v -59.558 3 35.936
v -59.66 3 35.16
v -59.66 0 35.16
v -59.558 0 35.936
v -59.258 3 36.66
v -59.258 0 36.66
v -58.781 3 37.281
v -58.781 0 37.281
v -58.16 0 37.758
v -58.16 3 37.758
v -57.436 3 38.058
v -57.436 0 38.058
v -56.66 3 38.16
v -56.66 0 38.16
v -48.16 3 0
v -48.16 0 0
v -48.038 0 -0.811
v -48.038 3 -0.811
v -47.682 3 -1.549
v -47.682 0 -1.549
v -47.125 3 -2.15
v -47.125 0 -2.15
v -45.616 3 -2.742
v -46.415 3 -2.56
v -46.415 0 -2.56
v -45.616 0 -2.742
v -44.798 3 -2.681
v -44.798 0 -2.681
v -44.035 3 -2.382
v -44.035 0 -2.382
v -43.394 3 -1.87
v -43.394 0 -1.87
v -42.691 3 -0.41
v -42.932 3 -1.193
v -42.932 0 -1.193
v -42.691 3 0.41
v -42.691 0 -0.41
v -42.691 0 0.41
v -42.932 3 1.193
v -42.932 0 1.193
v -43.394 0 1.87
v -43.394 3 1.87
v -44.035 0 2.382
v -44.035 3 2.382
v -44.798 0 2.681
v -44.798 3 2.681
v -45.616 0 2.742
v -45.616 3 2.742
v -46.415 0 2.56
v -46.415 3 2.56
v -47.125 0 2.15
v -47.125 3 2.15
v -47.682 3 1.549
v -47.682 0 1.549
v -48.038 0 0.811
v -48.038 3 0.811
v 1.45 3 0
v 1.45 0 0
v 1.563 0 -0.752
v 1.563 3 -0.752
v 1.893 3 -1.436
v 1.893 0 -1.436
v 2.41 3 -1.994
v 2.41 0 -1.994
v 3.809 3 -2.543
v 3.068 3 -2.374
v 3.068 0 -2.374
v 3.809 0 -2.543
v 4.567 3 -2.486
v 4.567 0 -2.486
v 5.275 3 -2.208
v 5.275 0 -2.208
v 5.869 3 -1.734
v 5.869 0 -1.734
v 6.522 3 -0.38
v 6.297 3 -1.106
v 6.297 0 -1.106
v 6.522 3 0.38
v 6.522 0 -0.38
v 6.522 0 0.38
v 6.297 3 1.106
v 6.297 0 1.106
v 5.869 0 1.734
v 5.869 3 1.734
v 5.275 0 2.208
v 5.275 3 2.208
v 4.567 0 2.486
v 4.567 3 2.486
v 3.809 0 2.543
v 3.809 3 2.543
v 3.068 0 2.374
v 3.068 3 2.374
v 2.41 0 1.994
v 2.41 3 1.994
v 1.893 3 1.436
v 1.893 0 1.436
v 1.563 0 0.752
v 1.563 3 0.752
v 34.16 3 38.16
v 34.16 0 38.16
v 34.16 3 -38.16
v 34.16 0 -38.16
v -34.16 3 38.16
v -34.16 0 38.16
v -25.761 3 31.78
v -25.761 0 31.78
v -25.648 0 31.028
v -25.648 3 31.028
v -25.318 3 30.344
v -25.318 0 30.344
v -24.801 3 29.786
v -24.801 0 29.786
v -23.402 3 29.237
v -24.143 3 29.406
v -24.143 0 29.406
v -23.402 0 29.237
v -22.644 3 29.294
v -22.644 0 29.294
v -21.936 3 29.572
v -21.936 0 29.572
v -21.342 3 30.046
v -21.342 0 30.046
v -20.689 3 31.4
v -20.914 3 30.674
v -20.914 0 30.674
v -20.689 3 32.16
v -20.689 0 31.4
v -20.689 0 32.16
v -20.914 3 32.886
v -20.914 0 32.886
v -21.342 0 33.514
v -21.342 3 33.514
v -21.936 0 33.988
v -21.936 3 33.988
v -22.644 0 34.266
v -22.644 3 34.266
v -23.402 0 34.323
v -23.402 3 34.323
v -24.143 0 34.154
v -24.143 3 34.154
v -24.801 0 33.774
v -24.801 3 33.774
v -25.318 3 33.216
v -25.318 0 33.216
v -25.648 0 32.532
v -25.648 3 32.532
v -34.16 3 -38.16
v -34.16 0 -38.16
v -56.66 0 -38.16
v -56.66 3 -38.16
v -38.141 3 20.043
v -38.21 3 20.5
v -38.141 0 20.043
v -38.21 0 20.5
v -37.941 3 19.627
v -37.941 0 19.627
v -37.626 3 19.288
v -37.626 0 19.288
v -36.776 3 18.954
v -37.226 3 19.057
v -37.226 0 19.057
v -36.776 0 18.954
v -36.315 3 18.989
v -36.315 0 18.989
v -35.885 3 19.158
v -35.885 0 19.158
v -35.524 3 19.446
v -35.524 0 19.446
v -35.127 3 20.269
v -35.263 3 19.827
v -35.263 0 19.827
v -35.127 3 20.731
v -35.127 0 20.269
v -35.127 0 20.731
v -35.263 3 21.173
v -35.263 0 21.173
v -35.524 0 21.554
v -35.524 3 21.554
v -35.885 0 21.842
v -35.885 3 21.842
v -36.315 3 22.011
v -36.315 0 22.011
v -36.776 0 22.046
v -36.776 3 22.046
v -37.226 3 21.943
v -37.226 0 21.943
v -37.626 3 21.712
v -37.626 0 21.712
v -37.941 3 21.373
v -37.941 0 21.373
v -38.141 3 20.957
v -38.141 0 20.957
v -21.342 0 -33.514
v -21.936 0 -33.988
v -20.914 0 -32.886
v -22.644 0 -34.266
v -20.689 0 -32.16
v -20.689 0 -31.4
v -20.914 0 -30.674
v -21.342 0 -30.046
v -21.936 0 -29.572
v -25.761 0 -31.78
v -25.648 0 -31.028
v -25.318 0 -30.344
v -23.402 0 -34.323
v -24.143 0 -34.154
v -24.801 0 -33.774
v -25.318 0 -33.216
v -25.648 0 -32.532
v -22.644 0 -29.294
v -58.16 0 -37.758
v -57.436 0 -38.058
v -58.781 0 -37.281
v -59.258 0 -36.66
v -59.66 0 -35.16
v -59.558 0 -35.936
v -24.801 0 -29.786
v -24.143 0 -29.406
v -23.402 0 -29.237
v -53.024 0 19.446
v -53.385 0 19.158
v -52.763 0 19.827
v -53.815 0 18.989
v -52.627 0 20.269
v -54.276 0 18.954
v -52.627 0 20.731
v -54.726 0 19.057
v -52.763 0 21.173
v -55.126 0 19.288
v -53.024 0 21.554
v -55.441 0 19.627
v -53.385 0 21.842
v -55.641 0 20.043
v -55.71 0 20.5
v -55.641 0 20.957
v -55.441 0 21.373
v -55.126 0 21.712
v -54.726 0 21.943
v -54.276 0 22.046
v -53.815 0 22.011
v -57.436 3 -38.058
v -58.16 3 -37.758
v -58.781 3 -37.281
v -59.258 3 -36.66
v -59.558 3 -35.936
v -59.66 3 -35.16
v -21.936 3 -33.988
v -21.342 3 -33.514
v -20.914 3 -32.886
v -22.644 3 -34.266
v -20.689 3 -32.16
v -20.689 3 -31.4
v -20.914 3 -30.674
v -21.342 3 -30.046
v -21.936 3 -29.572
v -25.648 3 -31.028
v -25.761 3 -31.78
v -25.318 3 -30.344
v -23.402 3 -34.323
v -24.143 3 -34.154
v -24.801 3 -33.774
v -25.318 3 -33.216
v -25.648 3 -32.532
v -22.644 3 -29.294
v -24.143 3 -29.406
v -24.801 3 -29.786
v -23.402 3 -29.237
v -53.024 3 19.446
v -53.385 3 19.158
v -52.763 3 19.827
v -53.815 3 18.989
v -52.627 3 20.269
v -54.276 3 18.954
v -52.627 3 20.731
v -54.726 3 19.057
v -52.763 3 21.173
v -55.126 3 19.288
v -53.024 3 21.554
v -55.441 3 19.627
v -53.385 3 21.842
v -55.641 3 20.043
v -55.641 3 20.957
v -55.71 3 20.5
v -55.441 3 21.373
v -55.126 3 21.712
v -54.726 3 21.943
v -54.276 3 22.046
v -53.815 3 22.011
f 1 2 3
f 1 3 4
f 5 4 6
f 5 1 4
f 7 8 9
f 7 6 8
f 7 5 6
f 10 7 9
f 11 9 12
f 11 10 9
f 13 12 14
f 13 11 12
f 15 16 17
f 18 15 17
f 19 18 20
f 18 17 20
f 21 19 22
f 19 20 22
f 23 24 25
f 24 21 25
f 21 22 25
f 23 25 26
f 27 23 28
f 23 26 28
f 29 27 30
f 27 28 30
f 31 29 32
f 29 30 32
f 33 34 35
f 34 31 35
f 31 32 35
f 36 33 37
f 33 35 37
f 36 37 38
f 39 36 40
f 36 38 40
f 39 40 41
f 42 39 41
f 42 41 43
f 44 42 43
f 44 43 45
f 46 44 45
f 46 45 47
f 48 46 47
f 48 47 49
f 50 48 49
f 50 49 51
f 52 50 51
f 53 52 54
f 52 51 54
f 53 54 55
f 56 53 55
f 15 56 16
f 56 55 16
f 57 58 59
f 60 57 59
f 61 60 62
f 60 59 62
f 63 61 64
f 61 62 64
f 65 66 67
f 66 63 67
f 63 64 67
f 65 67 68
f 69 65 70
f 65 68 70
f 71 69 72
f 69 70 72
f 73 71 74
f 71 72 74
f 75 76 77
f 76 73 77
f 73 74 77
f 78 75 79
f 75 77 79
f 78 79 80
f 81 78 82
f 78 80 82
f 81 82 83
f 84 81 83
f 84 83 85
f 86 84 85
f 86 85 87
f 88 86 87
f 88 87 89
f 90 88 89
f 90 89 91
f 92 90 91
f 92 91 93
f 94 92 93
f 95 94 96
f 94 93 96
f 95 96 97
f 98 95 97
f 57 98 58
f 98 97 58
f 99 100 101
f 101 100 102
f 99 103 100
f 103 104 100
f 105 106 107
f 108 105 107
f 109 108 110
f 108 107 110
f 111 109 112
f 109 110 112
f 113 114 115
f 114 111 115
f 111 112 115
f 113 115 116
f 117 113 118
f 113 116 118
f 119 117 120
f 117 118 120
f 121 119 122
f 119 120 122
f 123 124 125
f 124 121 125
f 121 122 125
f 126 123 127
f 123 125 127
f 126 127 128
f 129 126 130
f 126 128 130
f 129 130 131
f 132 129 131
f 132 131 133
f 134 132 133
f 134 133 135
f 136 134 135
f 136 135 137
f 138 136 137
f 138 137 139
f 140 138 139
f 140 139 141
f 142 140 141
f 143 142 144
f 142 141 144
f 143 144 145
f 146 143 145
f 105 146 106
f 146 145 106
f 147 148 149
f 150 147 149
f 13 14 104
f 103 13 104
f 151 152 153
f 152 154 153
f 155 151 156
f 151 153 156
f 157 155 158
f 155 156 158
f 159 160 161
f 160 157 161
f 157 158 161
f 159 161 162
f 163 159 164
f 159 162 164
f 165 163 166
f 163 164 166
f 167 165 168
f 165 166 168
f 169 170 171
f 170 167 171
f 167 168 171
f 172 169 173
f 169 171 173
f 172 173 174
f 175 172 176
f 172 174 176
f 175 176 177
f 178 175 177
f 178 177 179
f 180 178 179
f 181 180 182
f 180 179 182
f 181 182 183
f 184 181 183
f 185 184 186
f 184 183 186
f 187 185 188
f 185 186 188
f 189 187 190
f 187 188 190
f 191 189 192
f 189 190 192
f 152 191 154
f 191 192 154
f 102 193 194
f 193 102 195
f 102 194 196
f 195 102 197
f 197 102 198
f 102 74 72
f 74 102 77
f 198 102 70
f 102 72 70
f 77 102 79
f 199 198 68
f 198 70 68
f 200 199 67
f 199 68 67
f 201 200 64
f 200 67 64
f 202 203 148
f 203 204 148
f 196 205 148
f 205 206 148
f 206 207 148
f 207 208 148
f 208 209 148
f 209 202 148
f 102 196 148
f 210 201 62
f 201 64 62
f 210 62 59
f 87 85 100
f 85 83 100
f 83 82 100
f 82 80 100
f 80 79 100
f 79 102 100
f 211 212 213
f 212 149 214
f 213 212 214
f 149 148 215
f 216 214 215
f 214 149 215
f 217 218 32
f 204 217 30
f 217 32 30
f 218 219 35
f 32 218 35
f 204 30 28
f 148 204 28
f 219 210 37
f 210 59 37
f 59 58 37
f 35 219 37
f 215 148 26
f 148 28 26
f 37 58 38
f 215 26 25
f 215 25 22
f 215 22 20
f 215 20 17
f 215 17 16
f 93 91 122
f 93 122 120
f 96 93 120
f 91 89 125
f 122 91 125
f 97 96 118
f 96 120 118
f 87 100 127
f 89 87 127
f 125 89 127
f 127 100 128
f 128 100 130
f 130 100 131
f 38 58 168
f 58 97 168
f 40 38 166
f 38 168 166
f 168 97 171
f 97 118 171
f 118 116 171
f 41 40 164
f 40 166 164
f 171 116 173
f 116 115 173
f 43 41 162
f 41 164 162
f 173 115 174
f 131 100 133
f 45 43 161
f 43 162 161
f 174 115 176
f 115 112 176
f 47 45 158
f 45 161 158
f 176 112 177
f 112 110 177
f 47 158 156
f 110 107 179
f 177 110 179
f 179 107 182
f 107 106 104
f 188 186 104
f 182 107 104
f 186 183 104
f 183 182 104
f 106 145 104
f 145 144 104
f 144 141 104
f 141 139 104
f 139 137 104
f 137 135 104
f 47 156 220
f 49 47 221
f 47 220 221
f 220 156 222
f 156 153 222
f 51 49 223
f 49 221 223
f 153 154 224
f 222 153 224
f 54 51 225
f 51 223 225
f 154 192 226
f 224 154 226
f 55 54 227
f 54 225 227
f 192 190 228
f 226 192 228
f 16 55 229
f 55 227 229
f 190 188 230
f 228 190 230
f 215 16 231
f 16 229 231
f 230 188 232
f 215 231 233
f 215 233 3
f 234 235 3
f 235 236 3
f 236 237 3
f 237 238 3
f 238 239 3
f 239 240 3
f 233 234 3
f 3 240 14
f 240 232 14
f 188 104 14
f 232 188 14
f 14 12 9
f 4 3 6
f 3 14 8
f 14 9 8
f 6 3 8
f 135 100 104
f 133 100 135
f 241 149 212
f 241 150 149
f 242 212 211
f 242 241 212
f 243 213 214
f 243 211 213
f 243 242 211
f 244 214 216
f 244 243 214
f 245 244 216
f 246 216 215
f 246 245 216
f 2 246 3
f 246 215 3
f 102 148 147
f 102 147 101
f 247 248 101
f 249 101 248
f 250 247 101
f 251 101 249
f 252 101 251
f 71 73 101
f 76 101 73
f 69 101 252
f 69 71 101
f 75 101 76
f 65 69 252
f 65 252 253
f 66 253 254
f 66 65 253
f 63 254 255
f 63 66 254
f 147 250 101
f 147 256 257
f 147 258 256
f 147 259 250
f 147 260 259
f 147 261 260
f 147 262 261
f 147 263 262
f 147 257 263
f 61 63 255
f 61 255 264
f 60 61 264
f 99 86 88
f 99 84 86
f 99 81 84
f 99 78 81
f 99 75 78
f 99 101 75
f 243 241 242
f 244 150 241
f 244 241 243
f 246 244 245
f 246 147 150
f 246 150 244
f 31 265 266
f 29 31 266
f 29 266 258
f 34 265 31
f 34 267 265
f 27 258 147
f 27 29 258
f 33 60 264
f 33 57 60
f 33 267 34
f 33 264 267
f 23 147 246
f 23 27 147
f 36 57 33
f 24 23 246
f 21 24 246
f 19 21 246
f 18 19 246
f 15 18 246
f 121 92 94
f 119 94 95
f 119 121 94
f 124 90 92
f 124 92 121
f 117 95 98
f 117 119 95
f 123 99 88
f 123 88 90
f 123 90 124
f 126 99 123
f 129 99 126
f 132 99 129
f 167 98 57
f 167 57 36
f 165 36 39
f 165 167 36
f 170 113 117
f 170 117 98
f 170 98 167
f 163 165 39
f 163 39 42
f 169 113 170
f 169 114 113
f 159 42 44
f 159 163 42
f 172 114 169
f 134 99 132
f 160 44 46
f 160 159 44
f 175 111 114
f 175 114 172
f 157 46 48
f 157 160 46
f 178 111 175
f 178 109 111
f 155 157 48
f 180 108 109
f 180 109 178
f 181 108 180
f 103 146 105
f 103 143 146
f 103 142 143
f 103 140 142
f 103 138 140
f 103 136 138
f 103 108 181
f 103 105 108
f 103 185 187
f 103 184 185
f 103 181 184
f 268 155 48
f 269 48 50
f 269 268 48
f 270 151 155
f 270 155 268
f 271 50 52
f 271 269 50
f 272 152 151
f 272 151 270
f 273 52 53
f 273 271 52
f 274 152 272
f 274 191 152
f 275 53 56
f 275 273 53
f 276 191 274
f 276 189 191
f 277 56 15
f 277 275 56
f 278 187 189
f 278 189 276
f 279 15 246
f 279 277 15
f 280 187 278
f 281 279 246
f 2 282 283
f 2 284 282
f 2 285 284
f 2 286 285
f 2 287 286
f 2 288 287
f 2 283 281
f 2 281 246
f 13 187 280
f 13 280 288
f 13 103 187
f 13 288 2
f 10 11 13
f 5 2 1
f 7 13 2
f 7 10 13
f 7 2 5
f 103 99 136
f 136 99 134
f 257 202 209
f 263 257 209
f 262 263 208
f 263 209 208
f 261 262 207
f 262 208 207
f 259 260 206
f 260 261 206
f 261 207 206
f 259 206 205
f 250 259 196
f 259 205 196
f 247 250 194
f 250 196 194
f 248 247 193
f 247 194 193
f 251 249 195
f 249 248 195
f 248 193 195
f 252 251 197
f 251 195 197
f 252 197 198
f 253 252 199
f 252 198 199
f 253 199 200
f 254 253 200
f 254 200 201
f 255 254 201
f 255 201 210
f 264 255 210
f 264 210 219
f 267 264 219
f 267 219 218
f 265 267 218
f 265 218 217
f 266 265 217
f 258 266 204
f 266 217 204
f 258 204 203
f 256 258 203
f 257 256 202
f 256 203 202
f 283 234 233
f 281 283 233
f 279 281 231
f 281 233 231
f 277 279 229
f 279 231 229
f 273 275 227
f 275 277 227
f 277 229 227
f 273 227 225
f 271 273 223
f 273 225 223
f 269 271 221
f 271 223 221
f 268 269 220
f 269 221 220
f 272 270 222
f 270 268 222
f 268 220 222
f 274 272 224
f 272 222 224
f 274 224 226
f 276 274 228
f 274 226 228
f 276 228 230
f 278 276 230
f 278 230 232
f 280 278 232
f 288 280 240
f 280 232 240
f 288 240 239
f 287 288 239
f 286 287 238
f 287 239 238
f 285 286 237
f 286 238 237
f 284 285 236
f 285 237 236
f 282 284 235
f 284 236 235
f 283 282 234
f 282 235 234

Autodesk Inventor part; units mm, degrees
ref_plane "YZ Plane" through (0, 0, 0) normal (1, 0, 0) x (0, 1, 0)
ref_plane "XZ Plane" through (0, 0, 0) normal (0, 1, 0) x (-1, 0, 0)
ref_plane "XY Plane" through (0, 0, 0) normal (0, 0, 1) x (1, 0, 0)
sketch "Sketch1" plane through (4, 0, 0) normal (0, 1, 0) x (-1, 0, 0)
  circle A0 centre (0, 0) radius 30.16 construction
  line L0 (0, 0) -> (38.16, 0) construction
  line L1 (38.16, 38.16) -> (38.16, -38.16) construction
  line L2 (38.16, 38.16) -> (-30.16, 38.16)
  line L3 (38.16, -38.16) -> (-30.16, -38.16)
  circle A1 centre (27.211, 31.78) radius 2.55
  circle A2 centre (27.211, -31.78) radius 2.55
  circle A3 centre (0, 0) radius 2.55
  line L4 (-30.16, 38.16) -> (-30.16, -38.16)
  line L5 (38.16, 0) -> (49.41, 0) construction
  circle A4 centre (49.41, 0) radius 2.75
  line L6 (40.66, 20.5) -> (58.16, 20.5) construction
  circle A5 centre (58.16, 20.5) radius 1.55
  circle A6 centre (40.66, 20.5) radius 1.55
  line L7 (49.41, 0) -> (63.66, 0) construction
  line L8 (38.16, -38.16) -> (63.66, -38.16)
  line L9 (63.66, -38.16) -> (63.66, 38.16)
  line L10 (63.66, 38.16) -> (38.16, 38.16)
  dimension "d6" = 60.32
  dimension "d4" = 38.16
  dimension "d5" = 76.32
  dimension "d1" = 5.1
  dimension "d3" = 6.38
  dimension "d2" = 10.949
  dimension "d0" = 5.1
  dimension "d10" = 11.25
  dimension "d11" = 5.5
  dimension "d12" = 17.66
  dimension "d13" = 2.5
  dimension "d14" = 17.5
  dimension "d15" = 3.1
  dimension "d16" = 3.1
  dimension "d17" = 14.25
extrude "Extrusion1" add sketch "Sketch1" along normal blind 3
fillet "Fillet1" radius 3 2 edges at (-59.66, 1.5, 38.16) (-59.66, 1.5, -38.16)
properties part number "Tapa B1" material "Polycarbonate, Clear"
